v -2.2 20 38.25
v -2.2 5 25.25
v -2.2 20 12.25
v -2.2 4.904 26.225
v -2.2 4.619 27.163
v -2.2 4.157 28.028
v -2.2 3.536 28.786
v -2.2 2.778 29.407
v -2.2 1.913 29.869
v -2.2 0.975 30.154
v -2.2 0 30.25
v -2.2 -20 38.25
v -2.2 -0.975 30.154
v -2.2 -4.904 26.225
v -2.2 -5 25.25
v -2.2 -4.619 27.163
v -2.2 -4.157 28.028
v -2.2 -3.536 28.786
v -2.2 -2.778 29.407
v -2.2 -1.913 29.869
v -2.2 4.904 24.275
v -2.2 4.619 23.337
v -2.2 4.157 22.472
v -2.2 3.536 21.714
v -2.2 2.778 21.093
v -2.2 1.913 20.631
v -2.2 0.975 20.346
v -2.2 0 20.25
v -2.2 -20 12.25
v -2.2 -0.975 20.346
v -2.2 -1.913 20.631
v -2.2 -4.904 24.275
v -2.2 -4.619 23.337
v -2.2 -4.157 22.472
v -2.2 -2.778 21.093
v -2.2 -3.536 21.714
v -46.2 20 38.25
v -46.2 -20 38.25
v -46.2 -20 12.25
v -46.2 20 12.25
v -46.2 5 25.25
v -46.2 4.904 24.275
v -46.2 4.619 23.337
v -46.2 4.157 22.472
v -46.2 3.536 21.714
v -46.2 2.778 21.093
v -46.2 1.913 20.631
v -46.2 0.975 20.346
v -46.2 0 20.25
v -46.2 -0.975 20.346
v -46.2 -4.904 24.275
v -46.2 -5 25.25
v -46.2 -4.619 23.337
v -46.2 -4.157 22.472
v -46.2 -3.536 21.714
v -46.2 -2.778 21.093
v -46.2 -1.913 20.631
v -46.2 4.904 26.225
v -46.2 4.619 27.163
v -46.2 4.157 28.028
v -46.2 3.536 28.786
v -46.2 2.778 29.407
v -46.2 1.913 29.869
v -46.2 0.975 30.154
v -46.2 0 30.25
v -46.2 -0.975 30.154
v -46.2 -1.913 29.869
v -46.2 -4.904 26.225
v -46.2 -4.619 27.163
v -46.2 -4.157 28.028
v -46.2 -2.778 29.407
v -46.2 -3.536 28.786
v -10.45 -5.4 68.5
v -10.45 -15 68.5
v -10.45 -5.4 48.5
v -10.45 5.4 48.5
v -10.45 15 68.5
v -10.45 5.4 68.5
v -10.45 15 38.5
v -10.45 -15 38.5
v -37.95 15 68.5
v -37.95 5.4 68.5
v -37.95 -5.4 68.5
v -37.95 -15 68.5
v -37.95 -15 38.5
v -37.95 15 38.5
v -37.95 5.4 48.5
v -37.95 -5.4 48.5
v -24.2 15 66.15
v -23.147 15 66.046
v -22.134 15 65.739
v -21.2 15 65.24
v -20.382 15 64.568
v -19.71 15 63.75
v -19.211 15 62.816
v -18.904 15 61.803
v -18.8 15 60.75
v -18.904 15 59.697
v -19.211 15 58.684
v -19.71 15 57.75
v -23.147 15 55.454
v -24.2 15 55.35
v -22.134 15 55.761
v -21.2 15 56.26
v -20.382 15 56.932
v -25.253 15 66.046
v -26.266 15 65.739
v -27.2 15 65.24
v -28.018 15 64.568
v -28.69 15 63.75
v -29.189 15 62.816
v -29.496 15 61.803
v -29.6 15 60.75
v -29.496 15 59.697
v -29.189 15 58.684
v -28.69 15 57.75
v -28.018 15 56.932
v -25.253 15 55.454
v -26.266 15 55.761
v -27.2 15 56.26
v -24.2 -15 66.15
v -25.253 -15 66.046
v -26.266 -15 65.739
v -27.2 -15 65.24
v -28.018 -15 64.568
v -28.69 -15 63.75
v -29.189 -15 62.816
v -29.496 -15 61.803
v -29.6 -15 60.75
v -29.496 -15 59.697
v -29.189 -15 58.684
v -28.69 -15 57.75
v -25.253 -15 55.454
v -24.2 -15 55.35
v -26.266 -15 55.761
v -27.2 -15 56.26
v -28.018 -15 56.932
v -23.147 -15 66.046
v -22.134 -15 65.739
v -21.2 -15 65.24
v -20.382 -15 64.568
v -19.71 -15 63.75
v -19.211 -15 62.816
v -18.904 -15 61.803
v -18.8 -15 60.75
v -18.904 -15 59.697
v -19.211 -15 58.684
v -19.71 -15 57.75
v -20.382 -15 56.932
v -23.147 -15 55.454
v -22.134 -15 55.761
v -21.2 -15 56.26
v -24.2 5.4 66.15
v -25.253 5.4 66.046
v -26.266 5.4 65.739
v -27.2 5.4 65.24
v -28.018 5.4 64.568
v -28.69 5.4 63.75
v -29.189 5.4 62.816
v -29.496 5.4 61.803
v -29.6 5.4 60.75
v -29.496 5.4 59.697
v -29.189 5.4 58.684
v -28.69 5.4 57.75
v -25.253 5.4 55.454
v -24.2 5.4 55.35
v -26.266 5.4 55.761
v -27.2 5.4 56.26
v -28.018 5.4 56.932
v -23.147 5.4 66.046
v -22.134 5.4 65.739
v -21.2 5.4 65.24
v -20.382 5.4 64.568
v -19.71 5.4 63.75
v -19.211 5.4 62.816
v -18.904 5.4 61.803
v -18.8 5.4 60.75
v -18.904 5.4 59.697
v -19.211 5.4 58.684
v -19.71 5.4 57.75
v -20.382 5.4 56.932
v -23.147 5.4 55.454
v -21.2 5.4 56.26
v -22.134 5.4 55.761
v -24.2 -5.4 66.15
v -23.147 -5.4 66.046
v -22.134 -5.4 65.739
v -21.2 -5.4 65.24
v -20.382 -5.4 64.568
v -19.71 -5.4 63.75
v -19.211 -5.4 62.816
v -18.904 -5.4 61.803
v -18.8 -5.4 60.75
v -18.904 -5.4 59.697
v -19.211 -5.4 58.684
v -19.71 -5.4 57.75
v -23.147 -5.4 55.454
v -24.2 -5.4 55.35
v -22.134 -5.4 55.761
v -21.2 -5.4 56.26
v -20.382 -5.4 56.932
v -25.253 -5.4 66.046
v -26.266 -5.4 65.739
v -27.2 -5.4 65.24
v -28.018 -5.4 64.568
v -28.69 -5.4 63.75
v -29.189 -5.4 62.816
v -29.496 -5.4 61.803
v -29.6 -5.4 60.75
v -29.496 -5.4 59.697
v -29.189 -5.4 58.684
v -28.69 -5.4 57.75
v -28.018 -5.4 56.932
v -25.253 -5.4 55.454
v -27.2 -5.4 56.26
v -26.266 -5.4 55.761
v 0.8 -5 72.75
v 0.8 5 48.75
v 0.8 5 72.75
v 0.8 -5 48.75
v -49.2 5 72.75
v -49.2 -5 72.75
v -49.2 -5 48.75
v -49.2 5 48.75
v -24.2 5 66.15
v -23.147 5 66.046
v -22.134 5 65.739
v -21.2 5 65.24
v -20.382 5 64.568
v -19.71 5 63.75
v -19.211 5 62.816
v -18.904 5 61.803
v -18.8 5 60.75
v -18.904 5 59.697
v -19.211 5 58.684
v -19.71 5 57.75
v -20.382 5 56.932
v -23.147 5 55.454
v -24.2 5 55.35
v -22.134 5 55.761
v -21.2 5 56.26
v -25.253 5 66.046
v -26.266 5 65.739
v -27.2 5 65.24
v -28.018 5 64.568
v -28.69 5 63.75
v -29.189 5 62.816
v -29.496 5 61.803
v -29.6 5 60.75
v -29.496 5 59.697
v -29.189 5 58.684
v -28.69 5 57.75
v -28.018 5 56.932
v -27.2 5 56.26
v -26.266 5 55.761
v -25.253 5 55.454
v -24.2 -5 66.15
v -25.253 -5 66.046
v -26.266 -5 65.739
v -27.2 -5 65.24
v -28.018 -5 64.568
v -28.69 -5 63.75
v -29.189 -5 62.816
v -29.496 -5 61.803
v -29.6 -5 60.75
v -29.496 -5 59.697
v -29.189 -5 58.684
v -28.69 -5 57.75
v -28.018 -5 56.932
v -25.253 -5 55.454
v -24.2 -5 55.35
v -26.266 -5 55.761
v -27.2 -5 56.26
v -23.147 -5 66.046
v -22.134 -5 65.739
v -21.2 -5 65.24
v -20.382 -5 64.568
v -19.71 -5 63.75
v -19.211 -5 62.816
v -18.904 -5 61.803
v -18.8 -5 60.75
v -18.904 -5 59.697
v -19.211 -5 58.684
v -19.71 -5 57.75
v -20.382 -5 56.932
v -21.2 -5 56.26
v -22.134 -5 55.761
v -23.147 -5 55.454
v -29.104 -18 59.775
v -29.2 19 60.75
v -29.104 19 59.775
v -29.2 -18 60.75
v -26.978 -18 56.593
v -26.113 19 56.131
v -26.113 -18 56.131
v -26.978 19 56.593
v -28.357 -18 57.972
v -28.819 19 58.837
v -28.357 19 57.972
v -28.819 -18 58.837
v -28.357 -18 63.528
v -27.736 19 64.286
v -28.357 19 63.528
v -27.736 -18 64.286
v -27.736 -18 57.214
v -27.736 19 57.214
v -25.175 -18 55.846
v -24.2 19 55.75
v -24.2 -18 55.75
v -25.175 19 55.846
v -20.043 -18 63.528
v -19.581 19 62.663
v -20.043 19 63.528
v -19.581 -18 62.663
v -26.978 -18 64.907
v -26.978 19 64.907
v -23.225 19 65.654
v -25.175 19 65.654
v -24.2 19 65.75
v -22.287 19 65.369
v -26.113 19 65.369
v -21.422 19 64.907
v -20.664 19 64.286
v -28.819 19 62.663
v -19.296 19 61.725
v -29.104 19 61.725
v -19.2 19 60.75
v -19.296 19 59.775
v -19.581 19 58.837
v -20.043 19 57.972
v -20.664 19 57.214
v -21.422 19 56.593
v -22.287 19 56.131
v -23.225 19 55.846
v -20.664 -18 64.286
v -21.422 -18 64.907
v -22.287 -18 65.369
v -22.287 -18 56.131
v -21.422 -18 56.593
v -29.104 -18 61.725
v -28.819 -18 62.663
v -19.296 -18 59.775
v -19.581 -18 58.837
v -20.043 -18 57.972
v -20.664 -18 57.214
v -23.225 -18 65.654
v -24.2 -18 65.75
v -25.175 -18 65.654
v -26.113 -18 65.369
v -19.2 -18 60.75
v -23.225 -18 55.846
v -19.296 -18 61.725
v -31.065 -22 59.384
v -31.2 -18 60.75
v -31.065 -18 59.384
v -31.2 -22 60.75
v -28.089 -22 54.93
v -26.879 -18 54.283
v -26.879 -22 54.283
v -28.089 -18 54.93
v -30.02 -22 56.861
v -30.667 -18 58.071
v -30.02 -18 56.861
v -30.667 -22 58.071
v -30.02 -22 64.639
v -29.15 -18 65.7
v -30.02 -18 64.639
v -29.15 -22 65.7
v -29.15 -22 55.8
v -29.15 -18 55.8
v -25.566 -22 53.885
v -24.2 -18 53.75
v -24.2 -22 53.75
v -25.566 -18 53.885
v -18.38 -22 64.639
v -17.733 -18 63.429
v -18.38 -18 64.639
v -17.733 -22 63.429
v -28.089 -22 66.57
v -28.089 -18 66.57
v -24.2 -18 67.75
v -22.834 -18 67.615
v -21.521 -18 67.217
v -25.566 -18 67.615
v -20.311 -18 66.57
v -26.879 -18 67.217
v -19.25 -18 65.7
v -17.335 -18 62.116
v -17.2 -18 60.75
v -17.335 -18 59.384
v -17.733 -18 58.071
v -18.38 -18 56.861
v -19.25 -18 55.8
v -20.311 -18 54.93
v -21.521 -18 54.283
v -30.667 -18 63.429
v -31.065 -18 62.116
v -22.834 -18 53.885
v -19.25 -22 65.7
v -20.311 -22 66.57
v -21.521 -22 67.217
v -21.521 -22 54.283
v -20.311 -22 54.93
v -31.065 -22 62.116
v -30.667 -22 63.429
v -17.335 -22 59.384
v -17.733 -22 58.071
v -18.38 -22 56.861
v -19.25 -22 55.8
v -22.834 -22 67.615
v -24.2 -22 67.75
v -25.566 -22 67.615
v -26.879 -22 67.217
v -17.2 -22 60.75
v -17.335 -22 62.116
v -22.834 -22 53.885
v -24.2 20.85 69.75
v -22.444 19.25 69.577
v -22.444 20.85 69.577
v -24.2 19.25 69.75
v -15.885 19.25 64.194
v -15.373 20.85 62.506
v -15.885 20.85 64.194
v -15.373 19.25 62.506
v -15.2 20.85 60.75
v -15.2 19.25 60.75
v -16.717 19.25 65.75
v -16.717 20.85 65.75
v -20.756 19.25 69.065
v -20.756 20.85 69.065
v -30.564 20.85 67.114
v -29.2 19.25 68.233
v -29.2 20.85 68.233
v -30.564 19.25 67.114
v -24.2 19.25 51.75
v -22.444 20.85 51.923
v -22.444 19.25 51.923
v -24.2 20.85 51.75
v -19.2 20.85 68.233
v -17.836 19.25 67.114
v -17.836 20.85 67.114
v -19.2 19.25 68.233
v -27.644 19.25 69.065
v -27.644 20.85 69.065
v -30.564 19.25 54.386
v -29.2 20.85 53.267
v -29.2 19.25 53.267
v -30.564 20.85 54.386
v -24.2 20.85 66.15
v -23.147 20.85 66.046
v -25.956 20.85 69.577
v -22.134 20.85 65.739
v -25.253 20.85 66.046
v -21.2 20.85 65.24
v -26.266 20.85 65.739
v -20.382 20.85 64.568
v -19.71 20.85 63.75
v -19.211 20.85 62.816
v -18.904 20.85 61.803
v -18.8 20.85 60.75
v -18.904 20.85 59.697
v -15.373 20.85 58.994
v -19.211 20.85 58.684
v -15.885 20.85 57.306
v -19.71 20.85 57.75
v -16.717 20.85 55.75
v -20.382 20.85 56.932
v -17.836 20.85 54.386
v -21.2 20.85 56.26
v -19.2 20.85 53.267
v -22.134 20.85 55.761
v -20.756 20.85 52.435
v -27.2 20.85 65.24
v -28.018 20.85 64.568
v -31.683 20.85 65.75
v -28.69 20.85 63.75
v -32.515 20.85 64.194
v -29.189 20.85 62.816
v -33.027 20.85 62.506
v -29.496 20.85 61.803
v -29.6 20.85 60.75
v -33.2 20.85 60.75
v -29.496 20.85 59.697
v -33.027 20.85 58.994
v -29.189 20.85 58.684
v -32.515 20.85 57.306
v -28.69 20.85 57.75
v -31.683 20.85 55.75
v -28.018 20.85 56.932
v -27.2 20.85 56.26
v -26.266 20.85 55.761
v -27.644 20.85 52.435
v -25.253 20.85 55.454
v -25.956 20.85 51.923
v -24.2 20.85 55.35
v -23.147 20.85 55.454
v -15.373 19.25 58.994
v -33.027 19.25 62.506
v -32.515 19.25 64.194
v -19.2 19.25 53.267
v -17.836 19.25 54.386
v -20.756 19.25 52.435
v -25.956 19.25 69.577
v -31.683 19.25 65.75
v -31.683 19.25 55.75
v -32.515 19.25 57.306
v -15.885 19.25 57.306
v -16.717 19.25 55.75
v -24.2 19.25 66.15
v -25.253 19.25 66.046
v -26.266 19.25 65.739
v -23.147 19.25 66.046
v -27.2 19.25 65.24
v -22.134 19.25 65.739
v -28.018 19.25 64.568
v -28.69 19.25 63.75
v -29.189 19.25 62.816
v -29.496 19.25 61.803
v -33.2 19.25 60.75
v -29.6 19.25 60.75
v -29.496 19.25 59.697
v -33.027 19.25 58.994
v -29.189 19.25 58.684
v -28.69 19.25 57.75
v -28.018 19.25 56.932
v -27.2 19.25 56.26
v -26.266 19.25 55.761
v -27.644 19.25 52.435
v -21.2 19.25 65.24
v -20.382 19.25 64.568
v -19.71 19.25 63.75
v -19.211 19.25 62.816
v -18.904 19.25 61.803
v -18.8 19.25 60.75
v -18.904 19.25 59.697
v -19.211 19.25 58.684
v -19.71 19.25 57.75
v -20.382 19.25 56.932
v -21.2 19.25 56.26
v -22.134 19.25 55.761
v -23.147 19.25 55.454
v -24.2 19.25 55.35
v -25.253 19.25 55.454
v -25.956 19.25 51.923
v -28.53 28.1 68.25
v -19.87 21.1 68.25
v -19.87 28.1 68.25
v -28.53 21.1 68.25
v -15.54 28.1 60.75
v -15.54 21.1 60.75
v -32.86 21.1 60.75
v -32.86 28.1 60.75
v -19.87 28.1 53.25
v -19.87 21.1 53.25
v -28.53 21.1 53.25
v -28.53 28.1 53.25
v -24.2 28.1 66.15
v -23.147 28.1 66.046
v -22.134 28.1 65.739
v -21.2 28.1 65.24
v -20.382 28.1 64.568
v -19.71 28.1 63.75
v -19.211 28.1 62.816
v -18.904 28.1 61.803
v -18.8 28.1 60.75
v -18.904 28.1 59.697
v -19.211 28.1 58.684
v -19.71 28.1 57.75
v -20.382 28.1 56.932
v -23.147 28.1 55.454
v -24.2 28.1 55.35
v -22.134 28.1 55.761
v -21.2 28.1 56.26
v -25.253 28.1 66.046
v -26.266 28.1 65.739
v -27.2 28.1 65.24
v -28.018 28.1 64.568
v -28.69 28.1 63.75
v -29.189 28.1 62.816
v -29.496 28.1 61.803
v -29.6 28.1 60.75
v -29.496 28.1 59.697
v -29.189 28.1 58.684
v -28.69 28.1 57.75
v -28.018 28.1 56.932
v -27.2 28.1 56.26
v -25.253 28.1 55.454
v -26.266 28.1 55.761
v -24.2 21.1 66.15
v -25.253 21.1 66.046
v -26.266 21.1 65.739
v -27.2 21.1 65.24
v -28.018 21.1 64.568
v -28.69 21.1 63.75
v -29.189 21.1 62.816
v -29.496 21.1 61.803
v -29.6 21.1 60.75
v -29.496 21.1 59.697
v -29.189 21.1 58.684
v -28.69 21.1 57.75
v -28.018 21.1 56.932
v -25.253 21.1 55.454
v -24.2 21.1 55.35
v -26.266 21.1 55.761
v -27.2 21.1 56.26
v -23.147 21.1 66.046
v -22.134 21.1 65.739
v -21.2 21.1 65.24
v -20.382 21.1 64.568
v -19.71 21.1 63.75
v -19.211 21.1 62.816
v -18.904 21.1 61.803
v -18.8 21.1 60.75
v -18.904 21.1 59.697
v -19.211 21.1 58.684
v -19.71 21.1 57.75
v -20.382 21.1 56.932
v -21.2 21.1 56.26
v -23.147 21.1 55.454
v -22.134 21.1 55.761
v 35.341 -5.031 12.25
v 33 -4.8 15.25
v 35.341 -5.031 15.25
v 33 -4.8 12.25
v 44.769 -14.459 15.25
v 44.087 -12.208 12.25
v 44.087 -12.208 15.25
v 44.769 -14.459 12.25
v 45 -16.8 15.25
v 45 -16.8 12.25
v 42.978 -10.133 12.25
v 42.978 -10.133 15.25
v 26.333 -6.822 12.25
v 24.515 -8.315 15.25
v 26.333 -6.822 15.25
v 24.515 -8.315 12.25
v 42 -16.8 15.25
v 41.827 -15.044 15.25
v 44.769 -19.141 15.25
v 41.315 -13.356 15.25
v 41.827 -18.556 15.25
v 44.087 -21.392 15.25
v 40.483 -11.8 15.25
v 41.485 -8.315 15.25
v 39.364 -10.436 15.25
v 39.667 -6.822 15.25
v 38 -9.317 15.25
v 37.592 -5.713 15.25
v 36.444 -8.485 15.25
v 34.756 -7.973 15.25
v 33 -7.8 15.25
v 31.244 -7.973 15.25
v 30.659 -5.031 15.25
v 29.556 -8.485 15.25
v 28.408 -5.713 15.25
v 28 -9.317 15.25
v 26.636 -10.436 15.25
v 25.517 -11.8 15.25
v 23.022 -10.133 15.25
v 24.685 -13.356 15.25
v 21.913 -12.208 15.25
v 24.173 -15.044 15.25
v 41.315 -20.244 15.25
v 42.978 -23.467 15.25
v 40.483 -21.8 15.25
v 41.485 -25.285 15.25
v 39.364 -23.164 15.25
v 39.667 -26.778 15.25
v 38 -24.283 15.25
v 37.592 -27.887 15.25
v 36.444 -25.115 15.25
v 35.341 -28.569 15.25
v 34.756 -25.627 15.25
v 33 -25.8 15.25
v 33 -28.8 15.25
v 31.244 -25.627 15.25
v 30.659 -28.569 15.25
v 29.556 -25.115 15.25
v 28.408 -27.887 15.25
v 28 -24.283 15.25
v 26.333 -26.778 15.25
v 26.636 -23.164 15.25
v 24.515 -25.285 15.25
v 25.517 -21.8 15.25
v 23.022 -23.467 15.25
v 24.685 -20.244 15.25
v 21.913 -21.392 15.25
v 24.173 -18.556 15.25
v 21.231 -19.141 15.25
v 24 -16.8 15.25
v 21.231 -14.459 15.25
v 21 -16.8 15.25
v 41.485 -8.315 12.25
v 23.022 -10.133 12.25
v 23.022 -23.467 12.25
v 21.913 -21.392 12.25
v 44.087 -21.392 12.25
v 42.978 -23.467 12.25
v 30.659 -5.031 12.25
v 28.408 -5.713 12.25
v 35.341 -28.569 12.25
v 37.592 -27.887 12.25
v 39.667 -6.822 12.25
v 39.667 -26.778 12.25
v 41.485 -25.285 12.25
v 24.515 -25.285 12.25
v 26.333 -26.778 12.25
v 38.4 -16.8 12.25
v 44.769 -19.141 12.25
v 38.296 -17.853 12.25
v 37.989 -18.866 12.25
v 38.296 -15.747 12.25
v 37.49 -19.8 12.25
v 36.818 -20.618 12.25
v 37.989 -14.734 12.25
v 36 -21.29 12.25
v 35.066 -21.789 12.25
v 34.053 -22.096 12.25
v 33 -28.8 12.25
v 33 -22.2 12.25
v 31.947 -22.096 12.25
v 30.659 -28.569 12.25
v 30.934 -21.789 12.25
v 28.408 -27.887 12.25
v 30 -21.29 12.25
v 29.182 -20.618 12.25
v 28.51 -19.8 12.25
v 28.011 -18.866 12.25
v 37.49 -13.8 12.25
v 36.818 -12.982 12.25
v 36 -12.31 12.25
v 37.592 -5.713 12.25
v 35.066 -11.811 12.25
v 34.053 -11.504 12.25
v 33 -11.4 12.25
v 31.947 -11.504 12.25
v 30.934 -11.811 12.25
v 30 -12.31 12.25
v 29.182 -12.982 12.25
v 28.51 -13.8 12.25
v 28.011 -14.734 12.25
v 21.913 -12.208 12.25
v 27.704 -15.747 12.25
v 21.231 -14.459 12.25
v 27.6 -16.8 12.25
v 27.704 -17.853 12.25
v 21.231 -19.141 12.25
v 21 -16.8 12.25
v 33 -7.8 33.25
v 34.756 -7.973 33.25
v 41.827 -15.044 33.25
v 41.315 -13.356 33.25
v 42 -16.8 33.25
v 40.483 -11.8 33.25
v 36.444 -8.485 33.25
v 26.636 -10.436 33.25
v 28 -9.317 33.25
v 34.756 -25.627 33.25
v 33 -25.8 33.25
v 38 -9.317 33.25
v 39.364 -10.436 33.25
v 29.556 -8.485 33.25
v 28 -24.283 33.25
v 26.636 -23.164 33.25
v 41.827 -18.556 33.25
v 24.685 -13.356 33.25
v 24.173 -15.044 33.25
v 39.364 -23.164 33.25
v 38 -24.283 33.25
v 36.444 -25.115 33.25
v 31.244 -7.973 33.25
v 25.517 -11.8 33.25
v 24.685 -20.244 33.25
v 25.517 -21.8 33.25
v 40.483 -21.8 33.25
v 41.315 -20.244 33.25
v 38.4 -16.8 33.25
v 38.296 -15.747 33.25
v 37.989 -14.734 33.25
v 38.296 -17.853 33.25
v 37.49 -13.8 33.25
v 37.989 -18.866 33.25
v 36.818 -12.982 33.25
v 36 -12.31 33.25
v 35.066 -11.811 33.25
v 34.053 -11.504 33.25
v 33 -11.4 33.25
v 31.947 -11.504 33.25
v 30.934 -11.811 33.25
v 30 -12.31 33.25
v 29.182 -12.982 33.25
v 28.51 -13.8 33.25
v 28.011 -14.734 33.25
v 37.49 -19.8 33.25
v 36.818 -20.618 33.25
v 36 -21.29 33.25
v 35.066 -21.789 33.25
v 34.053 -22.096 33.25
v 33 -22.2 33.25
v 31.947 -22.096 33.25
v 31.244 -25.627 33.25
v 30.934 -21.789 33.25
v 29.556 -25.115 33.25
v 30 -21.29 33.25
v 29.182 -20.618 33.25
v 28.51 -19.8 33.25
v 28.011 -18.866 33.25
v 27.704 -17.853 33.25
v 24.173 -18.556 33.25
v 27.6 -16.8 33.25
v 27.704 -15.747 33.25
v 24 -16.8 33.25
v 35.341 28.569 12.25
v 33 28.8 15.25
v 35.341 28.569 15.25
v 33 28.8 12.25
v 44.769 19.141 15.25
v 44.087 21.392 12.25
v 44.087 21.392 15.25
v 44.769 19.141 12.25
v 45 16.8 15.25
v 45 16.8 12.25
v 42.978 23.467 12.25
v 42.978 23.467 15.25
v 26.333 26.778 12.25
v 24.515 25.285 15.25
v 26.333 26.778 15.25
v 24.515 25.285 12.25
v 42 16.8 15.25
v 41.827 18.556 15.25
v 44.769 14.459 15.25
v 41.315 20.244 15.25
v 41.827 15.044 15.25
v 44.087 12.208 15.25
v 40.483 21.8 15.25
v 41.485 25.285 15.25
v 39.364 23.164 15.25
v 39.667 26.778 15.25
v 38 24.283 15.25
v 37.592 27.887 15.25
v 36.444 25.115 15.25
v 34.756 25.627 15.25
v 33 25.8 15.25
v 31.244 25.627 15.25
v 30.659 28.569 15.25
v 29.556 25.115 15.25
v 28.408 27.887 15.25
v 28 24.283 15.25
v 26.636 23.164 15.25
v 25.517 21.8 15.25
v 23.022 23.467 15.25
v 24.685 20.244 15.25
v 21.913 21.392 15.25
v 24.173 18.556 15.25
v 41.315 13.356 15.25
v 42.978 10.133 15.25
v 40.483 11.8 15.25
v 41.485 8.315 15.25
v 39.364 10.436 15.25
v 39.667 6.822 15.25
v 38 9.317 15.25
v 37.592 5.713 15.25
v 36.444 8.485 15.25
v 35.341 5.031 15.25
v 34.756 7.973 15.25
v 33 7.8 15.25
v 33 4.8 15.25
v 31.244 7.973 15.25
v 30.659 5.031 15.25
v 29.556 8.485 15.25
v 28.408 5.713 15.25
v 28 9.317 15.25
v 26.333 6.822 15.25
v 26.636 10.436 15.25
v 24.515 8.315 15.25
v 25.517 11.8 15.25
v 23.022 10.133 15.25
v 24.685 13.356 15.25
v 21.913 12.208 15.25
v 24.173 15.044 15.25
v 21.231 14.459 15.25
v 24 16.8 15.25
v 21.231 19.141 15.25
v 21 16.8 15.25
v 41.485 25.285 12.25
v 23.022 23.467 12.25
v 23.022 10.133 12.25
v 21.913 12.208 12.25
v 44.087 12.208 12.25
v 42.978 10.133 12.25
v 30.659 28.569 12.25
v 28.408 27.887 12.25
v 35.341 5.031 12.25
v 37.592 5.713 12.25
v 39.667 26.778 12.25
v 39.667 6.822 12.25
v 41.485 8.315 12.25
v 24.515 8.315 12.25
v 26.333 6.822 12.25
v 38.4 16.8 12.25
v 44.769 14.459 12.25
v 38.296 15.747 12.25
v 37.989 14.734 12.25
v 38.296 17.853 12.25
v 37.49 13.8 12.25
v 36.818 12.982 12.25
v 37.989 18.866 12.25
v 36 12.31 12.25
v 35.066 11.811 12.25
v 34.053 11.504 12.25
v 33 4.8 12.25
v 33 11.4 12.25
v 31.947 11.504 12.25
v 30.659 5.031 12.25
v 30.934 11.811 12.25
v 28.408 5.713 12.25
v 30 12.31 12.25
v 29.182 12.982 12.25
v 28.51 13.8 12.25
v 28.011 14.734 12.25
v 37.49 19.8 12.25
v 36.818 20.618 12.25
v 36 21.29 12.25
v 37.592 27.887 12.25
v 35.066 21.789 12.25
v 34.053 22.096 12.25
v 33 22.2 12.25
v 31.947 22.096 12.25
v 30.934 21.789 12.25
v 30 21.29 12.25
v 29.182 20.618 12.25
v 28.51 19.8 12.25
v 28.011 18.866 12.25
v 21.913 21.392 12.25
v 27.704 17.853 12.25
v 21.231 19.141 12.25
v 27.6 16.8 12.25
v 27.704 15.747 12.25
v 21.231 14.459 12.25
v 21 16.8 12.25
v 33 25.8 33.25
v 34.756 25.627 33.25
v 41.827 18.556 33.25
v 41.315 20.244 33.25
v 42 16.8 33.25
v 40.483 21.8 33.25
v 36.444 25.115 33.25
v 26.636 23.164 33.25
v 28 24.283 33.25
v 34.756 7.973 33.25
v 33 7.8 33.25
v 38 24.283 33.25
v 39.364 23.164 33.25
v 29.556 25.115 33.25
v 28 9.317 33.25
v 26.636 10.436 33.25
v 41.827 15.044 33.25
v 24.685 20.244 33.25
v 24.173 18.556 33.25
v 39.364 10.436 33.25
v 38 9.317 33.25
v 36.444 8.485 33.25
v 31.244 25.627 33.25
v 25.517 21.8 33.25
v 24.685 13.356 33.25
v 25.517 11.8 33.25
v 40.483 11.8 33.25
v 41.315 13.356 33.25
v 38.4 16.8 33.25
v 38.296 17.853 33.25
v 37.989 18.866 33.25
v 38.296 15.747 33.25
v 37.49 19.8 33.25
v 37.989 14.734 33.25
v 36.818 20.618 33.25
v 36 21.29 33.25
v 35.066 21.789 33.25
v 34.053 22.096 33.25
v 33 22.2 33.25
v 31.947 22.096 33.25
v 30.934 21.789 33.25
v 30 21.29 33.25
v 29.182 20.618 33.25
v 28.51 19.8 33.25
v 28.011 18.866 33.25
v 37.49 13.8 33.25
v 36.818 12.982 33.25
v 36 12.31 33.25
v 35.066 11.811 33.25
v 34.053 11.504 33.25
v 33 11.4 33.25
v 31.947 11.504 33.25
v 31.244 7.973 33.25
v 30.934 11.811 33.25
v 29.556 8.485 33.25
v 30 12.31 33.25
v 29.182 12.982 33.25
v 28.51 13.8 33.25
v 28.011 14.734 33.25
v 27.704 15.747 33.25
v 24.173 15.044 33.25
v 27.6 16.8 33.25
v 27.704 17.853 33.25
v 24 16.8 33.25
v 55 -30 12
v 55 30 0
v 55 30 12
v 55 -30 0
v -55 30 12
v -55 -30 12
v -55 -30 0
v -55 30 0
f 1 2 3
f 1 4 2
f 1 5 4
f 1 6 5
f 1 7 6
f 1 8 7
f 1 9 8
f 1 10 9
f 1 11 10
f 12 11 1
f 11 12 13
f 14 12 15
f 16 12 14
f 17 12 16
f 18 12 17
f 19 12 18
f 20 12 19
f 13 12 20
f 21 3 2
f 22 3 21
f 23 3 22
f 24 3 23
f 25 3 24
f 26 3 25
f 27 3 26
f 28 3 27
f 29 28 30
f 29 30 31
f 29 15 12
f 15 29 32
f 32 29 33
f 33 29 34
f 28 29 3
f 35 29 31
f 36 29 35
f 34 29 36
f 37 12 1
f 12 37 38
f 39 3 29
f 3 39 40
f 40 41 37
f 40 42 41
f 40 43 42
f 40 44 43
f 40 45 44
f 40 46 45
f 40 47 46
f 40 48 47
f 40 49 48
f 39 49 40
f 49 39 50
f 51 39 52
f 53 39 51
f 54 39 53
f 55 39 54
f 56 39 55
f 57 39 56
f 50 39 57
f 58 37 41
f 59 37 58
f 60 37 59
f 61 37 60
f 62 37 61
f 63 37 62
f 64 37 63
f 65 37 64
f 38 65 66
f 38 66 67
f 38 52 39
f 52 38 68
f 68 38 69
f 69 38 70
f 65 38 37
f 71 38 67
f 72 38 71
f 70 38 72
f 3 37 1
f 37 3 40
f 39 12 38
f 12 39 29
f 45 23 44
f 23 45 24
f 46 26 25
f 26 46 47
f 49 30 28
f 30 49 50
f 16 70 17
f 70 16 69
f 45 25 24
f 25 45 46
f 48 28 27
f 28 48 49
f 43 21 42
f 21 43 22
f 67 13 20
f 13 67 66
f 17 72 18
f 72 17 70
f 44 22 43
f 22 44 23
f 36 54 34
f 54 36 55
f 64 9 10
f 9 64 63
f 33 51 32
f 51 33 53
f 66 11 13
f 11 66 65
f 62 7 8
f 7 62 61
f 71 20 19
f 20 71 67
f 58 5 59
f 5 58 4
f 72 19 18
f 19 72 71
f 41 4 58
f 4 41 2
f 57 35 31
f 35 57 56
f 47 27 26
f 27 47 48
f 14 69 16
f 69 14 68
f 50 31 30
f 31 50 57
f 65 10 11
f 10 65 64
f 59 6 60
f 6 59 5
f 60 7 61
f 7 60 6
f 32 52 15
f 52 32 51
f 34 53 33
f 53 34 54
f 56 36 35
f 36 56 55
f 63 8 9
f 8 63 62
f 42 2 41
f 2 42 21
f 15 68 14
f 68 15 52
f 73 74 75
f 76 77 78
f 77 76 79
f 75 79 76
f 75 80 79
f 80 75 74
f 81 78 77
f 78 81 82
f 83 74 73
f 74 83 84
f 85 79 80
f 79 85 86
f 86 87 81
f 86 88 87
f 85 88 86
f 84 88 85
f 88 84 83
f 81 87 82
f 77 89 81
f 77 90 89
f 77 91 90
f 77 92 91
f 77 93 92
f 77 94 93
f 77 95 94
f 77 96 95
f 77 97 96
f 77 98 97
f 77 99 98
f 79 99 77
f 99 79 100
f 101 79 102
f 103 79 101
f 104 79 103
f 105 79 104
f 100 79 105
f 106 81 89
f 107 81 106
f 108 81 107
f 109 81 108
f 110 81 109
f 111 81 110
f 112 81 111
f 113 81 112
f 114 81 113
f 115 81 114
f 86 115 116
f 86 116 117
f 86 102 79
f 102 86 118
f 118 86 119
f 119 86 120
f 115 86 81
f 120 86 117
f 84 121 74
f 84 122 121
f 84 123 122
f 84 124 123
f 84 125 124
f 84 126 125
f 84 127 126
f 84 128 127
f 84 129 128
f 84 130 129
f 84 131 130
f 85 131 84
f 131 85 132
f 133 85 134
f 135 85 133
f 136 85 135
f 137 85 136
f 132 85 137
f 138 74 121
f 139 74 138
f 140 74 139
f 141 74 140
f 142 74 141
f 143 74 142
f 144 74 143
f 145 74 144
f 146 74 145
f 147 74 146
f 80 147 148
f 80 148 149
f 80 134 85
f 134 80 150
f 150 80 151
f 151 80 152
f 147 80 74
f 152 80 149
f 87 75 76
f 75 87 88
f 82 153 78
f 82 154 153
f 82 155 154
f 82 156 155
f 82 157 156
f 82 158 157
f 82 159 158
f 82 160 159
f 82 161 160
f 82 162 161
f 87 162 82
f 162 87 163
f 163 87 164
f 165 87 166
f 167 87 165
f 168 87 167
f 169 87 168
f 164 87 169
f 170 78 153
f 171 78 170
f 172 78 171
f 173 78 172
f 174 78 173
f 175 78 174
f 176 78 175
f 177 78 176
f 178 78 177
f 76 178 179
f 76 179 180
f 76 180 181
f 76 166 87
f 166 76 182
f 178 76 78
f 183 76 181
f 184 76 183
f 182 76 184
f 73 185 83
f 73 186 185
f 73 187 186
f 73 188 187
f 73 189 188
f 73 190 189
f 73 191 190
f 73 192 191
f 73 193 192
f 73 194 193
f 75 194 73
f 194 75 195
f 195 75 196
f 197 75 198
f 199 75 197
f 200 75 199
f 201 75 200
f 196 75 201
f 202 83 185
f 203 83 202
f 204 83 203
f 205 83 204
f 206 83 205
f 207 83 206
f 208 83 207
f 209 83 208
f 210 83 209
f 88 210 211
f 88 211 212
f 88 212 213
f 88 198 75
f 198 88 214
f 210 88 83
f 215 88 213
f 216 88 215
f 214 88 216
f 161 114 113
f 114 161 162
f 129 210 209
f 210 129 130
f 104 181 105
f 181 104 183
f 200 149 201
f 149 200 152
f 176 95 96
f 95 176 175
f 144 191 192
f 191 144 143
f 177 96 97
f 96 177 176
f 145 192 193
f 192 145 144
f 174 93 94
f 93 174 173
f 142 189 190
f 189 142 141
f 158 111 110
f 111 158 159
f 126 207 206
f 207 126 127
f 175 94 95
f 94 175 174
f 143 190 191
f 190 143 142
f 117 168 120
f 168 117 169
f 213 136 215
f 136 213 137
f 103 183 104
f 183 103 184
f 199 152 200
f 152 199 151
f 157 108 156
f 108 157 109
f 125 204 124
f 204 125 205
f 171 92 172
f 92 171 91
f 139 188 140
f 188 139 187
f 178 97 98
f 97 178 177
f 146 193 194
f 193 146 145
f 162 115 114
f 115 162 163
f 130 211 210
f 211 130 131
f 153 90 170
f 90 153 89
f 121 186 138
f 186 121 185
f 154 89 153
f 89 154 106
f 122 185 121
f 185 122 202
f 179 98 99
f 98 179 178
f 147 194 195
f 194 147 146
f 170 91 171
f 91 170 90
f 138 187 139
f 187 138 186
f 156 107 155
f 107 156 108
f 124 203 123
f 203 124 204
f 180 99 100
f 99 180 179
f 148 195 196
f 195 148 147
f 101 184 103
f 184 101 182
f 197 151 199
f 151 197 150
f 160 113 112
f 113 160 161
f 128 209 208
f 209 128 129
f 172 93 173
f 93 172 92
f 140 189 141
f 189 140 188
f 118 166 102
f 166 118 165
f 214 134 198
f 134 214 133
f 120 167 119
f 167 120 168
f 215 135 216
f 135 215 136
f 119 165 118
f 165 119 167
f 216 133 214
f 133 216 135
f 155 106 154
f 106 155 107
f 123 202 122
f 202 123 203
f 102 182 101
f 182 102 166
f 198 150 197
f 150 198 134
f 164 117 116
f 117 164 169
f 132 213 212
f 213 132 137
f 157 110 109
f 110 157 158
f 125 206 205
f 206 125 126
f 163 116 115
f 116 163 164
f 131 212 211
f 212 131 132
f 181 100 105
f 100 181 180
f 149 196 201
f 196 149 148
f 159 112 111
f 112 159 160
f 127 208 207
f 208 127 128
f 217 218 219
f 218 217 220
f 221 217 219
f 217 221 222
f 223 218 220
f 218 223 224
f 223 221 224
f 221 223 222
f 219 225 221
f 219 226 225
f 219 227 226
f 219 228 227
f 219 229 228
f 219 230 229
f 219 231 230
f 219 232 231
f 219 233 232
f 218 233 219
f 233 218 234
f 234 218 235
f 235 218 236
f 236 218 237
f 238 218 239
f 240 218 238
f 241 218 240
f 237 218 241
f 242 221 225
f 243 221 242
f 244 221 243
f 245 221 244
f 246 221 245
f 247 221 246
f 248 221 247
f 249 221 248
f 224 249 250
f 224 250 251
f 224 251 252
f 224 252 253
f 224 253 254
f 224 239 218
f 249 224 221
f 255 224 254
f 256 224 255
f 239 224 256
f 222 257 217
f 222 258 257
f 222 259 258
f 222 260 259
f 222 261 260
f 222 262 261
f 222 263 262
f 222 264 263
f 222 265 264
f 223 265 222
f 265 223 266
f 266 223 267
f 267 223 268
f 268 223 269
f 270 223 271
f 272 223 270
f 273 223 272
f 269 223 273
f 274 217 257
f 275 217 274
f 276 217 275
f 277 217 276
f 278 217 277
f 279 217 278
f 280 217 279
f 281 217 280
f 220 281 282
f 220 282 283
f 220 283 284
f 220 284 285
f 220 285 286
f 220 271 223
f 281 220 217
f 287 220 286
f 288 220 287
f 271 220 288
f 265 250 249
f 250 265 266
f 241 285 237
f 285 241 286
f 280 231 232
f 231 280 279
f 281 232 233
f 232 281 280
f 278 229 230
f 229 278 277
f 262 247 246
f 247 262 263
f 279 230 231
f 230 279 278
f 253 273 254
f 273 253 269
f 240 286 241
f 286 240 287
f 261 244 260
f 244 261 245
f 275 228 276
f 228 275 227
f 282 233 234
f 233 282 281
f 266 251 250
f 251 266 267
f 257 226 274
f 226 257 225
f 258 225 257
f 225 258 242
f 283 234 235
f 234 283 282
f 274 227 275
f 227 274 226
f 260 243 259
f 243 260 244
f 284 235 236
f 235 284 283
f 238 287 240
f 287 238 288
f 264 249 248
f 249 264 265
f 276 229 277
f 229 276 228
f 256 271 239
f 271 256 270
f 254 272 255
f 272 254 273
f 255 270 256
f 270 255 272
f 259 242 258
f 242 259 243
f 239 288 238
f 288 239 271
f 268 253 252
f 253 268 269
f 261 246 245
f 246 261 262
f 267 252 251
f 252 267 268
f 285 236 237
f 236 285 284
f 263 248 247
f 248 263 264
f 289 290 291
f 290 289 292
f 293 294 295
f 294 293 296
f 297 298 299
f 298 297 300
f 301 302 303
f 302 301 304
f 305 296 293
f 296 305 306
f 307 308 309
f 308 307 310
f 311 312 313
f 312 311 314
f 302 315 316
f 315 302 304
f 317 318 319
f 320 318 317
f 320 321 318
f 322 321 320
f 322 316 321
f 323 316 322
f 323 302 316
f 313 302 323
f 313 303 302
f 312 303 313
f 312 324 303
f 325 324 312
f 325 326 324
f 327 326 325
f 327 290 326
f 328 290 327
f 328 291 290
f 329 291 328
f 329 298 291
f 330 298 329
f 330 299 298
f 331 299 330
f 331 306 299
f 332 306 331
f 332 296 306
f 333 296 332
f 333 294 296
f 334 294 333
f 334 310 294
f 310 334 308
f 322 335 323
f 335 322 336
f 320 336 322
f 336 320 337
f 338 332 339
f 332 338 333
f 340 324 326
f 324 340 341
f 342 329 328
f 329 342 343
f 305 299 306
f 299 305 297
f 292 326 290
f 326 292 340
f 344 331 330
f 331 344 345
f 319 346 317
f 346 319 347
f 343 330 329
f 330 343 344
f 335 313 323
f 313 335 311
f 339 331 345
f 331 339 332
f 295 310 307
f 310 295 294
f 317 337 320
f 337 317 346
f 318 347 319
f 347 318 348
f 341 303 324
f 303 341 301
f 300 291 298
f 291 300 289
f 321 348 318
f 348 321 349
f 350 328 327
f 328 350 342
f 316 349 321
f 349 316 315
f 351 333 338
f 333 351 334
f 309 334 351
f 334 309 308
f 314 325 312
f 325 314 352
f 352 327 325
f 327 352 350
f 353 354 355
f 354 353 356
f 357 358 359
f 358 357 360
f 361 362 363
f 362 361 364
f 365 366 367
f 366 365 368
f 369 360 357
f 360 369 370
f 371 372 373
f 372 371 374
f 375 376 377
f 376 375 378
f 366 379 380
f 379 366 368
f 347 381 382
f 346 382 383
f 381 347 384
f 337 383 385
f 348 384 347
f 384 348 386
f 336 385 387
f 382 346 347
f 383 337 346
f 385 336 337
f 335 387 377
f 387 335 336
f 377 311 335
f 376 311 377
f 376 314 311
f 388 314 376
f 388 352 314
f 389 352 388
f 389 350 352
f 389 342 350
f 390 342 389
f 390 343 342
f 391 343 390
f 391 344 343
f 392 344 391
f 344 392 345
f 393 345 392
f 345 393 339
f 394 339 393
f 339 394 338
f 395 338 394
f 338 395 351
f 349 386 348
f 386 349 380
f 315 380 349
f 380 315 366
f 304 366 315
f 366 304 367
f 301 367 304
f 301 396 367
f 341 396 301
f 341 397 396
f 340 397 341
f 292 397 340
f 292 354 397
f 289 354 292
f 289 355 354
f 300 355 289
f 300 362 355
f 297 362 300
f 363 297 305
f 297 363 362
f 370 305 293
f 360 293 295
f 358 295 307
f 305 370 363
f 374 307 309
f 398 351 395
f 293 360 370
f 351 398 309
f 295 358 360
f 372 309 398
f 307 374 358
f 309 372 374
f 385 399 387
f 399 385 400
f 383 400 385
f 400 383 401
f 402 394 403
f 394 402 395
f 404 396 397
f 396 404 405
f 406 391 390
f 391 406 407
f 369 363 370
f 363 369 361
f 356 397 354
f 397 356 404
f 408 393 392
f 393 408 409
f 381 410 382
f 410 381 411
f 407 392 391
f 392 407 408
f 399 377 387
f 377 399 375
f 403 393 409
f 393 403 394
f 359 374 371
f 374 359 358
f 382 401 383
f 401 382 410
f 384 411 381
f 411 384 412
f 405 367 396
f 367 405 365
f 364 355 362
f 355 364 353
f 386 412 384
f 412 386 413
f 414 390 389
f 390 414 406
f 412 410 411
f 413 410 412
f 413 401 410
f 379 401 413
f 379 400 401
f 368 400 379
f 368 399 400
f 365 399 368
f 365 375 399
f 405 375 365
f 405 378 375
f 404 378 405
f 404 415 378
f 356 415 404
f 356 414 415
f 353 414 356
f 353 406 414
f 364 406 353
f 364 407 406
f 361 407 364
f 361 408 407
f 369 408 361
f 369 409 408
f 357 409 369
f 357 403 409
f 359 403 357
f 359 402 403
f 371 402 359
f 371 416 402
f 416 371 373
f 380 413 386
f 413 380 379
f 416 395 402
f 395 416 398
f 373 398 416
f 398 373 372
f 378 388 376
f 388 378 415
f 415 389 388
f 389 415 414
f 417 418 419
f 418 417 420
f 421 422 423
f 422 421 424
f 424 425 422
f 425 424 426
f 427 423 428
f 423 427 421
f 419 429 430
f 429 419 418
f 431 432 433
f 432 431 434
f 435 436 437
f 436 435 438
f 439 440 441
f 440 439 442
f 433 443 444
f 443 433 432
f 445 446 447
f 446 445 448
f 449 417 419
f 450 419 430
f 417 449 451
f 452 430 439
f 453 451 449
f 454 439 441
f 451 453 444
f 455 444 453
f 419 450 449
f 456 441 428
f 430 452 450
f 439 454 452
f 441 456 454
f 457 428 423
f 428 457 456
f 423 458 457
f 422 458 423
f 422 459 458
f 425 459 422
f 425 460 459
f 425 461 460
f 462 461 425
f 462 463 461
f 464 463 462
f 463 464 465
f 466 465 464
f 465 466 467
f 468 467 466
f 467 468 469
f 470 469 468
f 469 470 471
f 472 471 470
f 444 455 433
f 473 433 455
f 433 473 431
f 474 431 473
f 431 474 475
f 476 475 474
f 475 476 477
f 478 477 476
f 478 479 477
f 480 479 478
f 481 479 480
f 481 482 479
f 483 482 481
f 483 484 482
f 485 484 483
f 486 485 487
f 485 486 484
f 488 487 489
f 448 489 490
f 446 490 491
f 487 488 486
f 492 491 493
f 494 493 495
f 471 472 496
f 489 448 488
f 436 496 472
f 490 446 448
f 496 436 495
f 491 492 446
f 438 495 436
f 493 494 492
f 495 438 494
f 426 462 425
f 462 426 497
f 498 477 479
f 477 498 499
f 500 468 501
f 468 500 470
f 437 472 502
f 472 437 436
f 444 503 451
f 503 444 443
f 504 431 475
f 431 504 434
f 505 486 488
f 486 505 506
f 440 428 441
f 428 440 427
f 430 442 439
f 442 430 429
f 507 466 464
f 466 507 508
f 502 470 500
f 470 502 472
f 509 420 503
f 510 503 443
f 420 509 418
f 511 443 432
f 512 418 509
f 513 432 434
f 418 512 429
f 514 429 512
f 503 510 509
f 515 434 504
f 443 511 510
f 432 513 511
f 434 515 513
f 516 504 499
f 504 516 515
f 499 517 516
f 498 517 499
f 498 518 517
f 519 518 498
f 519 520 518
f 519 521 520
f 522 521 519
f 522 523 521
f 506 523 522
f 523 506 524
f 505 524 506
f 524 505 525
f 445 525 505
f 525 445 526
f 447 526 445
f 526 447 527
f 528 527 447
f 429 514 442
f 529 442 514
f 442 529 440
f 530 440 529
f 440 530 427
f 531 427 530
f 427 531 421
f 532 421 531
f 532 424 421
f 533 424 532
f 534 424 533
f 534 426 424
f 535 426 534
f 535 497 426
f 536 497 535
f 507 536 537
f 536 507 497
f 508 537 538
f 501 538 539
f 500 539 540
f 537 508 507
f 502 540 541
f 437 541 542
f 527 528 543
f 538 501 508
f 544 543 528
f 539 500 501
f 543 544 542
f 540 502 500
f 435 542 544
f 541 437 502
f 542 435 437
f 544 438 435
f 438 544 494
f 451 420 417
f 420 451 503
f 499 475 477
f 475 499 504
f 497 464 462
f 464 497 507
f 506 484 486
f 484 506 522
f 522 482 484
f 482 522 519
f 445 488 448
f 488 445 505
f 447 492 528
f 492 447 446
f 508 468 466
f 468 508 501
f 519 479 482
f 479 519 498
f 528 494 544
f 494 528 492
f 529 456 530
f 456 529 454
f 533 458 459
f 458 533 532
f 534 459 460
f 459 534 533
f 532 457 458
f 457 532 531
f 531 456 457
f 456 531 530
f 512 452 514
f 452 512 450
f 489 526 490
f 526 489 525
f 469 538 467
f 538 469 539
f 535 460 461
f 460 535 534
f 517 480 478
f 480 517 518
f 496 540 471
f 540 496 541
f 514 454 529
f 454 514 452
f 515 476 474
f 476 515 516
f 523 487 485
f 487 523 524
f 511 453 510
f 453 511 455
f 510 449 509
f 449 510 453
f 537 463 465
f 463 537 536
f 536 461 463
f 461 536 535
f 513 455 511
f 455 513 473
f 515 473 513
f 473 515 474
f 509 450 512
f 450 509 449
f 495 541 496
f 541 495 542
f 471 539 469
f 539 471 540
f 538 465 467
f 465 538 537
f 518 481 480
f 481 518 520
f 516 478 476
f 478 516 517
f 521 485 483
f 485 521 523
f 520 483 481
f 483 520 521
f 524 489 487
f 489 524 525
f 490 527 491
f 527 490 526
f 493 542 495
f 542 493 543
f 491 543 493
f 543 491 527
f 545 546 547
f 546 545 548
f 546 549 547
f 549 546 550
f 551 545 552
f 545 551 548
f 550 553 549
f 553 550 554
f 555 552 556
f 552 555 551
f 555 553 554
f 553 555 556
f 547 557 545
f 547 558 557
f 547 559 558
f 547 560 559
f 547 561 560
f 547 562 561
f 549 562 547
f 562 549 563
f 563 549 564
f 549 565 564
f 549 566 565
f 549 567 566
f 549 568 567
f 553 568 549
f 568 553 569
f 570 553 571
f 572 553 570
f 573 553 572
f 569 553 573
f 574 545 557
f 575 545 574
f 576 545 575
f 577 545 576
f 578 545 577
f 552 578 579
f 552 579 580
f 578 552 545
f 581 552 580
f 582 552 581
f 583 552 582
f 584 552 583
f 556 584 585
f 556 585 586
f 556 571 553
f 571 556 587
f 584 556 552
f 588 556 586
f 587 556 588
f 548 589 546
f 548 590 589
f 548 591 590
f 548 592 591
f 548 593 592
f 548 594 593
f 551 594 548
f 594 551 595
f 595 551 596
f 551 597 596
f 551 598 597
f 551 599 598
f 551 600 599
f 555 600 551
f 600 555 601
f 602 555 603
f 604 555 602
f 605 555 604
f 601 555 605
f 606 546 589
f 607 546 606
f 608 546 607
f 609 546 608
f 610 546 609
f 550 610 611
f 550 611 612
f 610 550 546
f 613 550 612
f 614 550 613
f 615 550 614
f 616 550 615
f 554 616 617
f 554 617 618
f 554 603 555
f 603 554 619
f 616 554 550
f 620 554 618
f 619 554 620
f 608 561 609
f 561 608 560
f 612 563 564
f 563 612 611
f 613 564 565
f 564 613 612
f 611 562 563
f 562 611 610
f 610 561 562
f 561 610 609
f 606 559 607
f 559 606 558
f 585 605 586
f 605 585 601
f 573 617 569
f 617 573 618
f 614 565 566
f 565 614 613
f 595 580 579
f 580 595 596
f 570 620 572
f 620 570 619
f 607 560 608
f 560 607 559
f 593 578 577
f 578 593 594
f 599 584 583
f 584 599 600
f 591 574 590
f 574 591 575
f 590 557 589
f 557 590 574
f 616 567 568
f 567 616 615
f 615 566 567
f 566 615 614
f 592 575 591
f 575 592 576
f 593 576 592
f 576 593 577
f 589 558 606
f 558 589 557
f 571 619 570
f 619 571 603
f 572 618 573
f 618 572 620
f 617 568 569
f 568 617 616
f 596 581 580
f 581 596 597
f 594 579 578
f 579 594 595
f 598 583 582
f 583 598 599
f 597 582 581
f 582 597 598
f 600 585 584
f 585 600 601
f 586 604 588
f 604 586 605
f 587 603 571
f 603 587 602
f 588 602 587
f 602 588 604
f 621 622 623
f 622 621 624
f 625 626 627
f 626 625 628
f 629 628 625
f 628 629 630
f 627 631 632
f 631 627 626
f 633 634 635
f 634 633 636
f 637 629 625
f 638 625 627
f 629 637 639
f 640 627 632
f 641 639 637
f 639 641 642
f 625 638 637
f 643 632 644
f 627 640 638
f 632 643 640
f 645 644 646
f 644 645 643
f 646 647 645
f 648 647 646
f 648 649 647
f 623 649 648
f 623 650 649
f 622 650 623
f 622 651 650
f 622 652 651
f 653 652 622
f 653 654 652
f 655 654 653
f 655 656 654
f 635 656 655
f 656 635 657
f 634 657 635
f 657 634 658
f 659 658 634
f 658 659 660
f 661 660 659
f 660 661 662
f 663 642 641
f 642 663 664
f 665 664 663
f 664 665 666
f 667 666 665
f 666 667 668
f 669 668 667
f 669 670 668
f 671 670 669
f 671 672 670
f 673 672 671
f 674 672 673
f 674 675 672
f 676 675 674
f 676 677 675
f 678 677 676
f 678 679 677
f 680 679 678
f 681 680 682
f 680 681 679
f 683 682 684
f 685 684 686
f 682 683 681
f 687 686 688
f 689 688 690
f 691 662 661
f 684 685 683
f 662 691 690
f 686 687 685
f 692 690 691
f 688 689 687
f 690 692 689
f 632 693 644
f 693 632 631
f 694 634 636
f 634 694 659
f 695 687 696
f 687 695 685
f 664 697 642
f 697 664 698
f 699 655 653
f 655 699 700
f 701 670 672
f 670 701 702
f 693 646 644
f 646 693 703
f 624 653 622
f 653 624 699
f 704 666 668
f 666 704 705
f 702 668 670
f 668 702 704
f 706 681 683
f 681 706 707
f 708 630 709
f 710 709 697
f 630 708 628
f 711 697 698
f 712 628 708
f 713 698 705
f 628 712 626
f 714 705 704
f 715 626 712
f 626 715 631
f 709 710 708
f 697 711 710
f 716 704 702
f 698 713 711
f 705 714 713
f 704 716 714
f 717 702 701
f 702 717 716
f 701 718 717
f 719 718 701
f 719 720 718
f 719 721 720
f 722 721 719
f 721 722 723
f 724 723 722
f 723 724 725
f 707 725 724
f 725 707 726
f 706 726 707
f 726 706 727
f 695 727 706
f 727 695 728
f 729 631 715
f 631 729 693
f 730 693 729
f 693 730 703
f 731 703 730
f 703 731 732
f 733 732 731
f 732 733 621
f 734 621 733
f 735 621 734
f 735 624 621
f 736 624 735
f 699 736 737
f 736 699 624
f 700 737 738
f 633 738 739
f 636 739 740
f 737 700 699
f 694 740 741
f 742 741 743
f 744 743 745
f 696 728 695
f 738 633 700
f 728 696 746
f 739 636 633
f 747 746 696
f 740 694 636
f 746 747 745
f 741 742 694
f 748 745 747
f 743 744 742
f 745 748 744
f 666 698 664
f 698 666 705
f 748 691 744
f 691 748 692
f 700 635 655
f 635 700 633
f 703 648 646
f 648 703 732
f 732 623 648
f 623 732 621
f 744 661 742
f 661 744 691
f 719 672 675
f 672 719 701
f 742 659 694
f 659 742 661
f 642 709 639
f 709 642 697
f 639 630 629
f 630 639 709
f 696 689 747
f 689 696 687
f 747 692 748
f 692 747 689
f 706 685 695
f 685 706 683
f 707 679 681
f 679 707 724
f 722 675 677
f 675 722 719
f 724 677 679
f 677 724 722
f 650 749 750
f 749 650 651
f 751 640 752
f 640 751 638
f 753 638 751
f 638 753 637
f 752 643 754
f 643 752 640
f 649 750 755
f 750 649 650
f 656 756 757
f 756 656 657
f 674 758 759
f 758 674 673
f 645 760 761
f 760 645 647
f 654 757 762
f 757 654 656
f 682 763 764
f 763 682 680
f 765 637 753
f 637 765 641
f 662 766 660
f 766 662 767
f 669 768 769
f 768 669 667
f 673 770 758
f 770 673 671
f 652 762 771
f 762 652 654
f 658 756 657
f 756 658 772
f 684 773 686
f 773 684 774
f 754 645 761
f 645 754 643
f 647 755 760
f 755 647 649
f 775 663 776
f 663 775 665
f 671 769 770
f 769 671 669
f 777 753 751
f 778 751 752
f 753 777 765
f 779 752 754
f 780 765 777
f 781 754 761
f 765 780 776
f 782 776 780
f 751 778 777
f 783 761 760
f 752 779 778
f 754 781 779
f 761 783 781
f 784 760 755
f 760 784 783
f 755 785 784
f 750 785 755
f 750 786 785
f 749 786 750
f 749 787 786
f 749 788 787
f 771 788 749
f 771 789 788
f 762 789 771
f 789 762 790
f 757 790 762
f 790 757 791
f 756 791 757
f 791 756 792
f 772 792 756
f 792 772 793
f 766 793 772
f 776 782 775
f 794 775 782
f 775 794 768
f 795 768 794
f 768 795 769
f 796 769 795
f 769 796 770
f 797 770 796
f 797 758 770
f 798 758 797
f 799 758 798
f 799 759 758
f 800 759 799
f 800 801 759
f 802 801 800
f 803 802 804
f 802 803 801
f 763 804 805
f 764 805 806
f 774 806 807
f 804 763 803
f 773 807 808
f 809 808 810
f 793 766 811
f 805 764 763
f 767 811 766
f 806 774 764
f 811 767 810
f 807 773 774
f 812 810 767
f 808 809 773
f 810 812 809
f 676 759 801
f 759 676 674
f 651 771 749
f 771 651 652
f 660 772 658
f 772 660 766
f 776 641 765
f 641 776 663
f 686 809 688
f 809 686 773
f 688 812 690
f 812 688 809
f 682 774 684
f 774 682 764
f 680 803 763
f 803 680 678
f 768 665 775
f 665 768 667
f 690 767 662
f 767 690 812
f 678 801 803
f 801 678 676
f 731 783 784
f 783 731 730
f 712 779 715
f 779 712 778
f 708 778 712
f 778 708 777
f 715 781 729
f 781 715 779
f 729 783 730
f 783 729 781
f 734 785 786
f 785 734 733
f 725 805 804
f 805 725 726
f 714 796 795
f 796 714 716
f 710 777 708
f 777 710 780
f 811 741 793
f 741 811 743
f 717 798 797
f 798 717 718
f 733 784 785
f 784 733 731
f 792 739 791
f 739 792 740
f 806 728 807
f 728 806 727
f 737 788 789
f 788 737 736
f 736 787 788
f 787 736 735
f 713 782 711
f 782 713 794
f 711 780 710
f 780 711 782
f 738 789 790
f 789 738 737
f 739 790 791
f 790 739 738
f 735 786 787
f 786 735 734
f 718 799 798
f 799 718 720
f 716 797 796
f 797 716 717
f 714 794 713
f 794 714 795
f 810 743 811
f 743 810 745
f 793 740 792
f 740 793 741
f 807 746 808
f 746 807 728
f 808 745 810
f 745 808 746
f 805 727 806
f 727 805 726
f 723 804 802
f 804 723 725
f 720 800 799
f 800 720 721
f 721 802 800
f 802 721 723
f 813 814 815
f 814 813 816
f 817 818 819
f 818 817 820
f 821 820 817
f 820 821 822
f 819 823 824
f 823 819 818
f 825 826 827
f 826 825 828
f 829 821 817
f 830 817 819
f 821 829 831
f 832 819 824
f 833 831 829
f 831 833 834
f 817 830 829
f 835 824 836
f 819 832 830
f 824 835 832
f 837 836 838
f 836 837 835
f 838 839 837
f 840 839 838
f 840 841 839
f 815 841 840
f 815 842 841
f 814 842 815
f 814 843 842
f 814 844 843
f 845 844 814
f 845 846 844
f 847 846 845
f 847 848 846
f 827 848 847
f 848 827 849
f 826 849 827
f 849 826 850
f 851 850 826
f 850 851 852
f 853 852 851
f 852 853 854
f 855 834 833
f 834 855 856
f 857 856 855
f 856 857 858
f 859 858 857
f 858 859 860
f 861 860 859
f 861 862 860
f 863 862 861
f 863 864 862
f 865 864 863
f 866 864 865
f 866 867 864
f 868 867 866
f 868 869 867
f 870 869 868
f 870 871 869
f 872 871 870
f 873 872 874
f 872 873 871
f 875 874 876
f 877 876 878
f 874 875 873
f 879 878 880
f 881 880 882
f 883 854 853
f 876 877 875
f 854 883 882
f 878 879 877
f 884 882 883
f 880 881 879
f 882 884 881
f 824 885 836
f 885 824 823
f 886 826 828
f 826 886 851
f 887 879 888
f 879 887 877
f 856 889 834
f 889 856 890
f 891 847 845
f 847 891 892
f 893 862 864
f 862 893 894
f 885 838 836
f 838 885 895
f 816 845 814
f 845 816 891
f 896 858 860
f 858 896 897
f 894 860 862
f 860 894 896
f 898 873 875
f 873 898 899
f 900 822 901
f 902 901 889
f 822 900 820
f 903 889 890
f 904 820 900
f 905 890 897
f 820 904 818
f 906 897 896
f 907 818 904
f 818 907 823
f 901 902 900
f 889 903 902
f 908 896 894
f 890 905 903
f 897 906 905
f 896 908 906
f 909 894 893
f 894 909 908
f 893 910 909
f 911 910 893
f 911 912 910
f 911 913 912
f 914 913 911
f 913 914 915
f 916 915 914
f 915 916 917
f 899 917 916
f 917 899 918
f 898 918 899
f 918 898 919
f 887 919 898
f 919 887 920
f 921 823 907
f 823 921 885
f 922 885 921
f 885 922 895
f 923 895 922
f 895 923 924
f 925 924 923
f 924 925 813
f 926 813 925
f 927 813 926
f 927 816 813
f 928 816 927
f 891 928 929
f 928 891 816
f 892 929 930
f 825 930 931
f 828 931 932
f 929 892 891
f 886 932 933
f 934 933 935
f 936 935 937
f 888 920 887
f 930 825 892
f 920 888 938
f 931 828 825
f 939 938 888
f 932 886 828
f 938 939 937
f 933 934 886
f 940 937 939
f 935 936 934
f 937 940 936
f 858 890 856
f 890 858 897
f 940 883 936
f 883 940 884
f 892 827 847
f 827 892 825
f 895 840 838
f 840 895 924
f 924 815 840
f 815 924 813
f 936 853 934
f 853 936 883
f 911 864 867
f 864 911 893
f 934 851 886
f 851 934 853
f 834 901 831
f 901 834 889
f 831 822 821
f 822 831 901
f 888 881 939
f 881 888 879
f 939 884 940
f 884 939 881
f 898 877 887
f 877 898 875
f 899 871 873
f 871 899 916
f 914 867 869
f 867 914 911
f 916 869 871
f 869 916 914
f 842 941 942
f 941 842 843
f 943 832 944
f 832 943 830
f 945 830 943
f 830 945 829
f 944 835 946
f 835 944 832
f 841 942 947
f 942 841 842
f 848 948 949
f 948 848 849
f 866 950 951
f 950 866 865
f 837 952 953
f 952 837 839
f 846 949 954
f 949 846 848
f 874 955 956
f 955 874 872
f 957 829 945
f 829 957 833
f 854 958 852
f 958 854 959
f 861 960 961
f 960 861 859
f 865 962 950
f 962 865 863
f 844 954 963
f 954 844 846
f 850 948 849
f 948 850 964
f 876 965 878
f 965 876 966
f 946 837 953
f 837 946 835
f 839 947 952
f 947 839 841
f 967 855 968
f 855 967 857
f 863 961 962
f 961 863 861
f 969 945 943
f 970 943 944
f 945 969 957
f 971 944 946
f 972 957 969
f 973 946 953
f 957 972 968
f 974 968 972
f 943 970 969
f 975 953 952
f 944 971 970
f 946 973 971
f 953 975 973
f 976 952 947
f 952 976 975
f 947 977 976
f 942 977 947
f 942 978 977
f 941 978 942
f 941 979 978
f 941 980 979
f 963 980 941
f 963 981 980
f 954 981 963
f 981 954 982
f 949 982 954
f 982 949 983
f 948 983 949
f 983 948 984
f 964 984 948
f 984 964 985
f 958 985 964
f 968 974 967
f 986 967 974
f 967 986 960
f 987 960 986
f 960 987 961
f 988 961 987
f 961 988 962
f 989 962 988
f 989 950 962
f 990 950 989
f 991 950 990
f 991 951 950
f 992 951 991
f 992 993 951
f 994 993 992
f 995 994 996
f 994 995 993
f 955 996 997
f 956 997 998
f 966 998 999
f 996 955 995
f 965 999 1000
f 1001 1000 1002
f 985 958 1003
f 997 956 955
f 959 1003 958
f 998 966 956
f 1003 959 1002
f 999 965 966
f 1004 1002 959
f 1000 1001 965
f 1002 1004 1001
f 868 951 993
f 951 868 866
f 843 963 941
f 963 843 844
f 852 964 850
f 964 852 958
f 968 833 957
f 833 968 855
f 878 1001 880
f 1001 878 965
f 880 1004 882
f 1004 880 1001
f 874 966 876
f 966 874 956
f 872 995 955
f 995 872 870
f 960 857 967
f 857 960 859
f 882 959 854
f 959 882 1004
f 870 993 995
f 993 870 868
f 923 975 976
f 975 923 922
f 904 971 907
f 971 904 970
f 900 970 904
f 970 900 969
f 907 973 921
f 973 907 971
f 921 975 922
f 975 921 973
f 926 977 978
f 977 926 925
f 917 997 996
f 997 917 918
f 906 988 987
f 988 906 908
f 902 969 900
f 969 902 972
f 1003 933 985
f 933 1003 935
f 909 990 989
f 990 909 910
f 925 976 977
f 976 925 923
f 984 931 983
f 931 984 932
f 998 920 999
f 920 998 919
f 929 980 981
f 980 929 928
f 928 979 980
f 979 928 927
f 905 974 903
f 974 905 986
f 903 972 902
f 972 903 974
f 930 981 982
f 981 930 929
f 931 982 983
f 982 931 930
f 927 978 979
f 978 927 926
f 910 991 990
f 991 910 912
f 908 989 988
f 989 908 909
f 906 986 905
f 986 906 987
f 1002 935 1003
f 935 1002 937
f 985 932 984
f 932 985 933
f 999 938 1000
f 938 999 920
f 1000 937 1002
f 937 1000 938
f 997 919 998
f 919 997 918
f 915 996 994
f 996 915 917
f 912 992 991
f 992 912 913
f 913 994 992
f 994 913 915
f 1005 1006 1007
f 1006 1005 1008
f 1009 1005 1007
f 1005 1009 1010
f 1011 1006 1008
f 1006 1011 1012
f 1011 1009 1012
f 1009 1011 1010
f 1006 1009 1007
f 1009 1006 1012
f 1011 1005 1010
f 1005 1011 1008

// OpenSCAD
$fn = 32;

// ------------------------------------------------------------------------
// Indexing jig: plate 110 x 60 mm, pin d10
// Every part is its own module, assembly() places every instance.
// ------------------------------------------------------------------------

// --- part 1 ---
module jig_plate() {
  difference() {
    translate([-55, -30, 0]) cube([110, 60, 12]);
  }
}

// --- part 2 ---
module locator_block() {
  difference() {
    translate([-22, -20, 0]) cube([44, 40, 26]);
    translate([0, 0, 13]) rotate([0, 90, 0]) cylinder(h = 46, d = 10, center = true);
  }
}

// --- part 3 ---
module index_fork() {
  difference() {
    translate([-13.75, -15, 0]) cube([27.5, 30, 30]);
    translate([-14.75, -5.4, 10]) cube([29.5, 10.8, 21]);
    translate([0, 0, 22.25]) rotate([90, 0, 0]) cylinder(h = 32, d = 10.8, center = true);
  }
}

// --- part 4 ---
module index_arm() {
  difference() {
    translate([-25, -5, 0]) cube([50, 10, 24]);
    translate([0, 0, 12]) rotate([90, 0, 0]) cylinder(h = 12, d = 10.8, center = true);
  }
}

// --- part 5 ---
module index_pin() {
  rotate([0, 90, 0]) cylinder(h = 38, d = 10, center = true);
  translate([-22, 0, 0]) rotate([0, 90, 0]) cylinder(h = 4, d = 14);
}

// --- part 6 ---
module pin_washer() {
  difference() {
      translate([0, 0, 0]) cylinder(h = 1.6, d = 18);
      translate([0, 0, -1]) cylinder(h = 3.6, d = 10.8);
    }
}

// --- part 7 ---
module lock_nut() {
  difference() {
    linear_extrude(height = 7) polygon(points = [[8.66, 0], [4.33, 7.5], [-4.33, 7.5], [-8.66, 0], [-4.33, -7.5], [4.33, -7.5]]);
    translate([0, 0, -1]) cylinder(h = 9, d = 10.8);
  }
}

// --- part 8 ---
module guide_bush_a() {
  difference() {
    union() {
      cylinder(h = 3, d = 24);
      translate([0, 0, 3]) cylinder(h = 18, d = 18);
    }
    translate([0, 0, -1]) cylinder(h = 23, d = 10.8);
  }
}

// --- part 9 ---
module guide_bush_b() {
  difference() {
    union() {
      cylinder(h = 3, d = 24);
      translate([0, 0, 3]) cylinder(h = 18, d = 18);
    }
    translate([0, 0, -1]) cylinder(h = 23, d = 10.8);
  }
}

// --- assembly ---
module assembly() {
  color([0.80, 0.24, 0.20]) translate([0, 0, 0]) rotate([0, 0, 0]) jig_plate();
  color([0.20, 0.45, 0.75]) translate([-24.2, 0, 12.25]) rotate([0, 0, 0]) locator_block();
  color([0.25, 0.62, 0.32]) translate([-24.2, 0, 38.5]) rotate([0, 0, 0]) index_fork();
  color([0.92, 0.70, 0.18]) translate([-24.2, 0, 48.75]) rotate([0, 0, 0]) index_arm();
  color([0.58, 0.35, 0.70]) translate([-24.2, 0, 60.75]) rotate([0, 0, 90]) index_pin();
  color([0.16, 0.66, 0.66]) translate([-24.2, 20.85, 60.75]) rotate([90, 0, 0]) pin_washer();
  color([0.85, 0.48, 0.18]) translate([-24.2, 28.1, 60.75]) rotate([90, 0, 0]) lock_nut();
  color([0.55, 0.60, 0.65]) translate([33, -16.8, 12.25]) rotate([0, 0, 0]) guide_bush_a();
  color([0.75, 0.30, 0.55]) translate([33, 16.8, 12.25]) rotate([0, 0, 0]) guide_bush_b();
}

assembly();
